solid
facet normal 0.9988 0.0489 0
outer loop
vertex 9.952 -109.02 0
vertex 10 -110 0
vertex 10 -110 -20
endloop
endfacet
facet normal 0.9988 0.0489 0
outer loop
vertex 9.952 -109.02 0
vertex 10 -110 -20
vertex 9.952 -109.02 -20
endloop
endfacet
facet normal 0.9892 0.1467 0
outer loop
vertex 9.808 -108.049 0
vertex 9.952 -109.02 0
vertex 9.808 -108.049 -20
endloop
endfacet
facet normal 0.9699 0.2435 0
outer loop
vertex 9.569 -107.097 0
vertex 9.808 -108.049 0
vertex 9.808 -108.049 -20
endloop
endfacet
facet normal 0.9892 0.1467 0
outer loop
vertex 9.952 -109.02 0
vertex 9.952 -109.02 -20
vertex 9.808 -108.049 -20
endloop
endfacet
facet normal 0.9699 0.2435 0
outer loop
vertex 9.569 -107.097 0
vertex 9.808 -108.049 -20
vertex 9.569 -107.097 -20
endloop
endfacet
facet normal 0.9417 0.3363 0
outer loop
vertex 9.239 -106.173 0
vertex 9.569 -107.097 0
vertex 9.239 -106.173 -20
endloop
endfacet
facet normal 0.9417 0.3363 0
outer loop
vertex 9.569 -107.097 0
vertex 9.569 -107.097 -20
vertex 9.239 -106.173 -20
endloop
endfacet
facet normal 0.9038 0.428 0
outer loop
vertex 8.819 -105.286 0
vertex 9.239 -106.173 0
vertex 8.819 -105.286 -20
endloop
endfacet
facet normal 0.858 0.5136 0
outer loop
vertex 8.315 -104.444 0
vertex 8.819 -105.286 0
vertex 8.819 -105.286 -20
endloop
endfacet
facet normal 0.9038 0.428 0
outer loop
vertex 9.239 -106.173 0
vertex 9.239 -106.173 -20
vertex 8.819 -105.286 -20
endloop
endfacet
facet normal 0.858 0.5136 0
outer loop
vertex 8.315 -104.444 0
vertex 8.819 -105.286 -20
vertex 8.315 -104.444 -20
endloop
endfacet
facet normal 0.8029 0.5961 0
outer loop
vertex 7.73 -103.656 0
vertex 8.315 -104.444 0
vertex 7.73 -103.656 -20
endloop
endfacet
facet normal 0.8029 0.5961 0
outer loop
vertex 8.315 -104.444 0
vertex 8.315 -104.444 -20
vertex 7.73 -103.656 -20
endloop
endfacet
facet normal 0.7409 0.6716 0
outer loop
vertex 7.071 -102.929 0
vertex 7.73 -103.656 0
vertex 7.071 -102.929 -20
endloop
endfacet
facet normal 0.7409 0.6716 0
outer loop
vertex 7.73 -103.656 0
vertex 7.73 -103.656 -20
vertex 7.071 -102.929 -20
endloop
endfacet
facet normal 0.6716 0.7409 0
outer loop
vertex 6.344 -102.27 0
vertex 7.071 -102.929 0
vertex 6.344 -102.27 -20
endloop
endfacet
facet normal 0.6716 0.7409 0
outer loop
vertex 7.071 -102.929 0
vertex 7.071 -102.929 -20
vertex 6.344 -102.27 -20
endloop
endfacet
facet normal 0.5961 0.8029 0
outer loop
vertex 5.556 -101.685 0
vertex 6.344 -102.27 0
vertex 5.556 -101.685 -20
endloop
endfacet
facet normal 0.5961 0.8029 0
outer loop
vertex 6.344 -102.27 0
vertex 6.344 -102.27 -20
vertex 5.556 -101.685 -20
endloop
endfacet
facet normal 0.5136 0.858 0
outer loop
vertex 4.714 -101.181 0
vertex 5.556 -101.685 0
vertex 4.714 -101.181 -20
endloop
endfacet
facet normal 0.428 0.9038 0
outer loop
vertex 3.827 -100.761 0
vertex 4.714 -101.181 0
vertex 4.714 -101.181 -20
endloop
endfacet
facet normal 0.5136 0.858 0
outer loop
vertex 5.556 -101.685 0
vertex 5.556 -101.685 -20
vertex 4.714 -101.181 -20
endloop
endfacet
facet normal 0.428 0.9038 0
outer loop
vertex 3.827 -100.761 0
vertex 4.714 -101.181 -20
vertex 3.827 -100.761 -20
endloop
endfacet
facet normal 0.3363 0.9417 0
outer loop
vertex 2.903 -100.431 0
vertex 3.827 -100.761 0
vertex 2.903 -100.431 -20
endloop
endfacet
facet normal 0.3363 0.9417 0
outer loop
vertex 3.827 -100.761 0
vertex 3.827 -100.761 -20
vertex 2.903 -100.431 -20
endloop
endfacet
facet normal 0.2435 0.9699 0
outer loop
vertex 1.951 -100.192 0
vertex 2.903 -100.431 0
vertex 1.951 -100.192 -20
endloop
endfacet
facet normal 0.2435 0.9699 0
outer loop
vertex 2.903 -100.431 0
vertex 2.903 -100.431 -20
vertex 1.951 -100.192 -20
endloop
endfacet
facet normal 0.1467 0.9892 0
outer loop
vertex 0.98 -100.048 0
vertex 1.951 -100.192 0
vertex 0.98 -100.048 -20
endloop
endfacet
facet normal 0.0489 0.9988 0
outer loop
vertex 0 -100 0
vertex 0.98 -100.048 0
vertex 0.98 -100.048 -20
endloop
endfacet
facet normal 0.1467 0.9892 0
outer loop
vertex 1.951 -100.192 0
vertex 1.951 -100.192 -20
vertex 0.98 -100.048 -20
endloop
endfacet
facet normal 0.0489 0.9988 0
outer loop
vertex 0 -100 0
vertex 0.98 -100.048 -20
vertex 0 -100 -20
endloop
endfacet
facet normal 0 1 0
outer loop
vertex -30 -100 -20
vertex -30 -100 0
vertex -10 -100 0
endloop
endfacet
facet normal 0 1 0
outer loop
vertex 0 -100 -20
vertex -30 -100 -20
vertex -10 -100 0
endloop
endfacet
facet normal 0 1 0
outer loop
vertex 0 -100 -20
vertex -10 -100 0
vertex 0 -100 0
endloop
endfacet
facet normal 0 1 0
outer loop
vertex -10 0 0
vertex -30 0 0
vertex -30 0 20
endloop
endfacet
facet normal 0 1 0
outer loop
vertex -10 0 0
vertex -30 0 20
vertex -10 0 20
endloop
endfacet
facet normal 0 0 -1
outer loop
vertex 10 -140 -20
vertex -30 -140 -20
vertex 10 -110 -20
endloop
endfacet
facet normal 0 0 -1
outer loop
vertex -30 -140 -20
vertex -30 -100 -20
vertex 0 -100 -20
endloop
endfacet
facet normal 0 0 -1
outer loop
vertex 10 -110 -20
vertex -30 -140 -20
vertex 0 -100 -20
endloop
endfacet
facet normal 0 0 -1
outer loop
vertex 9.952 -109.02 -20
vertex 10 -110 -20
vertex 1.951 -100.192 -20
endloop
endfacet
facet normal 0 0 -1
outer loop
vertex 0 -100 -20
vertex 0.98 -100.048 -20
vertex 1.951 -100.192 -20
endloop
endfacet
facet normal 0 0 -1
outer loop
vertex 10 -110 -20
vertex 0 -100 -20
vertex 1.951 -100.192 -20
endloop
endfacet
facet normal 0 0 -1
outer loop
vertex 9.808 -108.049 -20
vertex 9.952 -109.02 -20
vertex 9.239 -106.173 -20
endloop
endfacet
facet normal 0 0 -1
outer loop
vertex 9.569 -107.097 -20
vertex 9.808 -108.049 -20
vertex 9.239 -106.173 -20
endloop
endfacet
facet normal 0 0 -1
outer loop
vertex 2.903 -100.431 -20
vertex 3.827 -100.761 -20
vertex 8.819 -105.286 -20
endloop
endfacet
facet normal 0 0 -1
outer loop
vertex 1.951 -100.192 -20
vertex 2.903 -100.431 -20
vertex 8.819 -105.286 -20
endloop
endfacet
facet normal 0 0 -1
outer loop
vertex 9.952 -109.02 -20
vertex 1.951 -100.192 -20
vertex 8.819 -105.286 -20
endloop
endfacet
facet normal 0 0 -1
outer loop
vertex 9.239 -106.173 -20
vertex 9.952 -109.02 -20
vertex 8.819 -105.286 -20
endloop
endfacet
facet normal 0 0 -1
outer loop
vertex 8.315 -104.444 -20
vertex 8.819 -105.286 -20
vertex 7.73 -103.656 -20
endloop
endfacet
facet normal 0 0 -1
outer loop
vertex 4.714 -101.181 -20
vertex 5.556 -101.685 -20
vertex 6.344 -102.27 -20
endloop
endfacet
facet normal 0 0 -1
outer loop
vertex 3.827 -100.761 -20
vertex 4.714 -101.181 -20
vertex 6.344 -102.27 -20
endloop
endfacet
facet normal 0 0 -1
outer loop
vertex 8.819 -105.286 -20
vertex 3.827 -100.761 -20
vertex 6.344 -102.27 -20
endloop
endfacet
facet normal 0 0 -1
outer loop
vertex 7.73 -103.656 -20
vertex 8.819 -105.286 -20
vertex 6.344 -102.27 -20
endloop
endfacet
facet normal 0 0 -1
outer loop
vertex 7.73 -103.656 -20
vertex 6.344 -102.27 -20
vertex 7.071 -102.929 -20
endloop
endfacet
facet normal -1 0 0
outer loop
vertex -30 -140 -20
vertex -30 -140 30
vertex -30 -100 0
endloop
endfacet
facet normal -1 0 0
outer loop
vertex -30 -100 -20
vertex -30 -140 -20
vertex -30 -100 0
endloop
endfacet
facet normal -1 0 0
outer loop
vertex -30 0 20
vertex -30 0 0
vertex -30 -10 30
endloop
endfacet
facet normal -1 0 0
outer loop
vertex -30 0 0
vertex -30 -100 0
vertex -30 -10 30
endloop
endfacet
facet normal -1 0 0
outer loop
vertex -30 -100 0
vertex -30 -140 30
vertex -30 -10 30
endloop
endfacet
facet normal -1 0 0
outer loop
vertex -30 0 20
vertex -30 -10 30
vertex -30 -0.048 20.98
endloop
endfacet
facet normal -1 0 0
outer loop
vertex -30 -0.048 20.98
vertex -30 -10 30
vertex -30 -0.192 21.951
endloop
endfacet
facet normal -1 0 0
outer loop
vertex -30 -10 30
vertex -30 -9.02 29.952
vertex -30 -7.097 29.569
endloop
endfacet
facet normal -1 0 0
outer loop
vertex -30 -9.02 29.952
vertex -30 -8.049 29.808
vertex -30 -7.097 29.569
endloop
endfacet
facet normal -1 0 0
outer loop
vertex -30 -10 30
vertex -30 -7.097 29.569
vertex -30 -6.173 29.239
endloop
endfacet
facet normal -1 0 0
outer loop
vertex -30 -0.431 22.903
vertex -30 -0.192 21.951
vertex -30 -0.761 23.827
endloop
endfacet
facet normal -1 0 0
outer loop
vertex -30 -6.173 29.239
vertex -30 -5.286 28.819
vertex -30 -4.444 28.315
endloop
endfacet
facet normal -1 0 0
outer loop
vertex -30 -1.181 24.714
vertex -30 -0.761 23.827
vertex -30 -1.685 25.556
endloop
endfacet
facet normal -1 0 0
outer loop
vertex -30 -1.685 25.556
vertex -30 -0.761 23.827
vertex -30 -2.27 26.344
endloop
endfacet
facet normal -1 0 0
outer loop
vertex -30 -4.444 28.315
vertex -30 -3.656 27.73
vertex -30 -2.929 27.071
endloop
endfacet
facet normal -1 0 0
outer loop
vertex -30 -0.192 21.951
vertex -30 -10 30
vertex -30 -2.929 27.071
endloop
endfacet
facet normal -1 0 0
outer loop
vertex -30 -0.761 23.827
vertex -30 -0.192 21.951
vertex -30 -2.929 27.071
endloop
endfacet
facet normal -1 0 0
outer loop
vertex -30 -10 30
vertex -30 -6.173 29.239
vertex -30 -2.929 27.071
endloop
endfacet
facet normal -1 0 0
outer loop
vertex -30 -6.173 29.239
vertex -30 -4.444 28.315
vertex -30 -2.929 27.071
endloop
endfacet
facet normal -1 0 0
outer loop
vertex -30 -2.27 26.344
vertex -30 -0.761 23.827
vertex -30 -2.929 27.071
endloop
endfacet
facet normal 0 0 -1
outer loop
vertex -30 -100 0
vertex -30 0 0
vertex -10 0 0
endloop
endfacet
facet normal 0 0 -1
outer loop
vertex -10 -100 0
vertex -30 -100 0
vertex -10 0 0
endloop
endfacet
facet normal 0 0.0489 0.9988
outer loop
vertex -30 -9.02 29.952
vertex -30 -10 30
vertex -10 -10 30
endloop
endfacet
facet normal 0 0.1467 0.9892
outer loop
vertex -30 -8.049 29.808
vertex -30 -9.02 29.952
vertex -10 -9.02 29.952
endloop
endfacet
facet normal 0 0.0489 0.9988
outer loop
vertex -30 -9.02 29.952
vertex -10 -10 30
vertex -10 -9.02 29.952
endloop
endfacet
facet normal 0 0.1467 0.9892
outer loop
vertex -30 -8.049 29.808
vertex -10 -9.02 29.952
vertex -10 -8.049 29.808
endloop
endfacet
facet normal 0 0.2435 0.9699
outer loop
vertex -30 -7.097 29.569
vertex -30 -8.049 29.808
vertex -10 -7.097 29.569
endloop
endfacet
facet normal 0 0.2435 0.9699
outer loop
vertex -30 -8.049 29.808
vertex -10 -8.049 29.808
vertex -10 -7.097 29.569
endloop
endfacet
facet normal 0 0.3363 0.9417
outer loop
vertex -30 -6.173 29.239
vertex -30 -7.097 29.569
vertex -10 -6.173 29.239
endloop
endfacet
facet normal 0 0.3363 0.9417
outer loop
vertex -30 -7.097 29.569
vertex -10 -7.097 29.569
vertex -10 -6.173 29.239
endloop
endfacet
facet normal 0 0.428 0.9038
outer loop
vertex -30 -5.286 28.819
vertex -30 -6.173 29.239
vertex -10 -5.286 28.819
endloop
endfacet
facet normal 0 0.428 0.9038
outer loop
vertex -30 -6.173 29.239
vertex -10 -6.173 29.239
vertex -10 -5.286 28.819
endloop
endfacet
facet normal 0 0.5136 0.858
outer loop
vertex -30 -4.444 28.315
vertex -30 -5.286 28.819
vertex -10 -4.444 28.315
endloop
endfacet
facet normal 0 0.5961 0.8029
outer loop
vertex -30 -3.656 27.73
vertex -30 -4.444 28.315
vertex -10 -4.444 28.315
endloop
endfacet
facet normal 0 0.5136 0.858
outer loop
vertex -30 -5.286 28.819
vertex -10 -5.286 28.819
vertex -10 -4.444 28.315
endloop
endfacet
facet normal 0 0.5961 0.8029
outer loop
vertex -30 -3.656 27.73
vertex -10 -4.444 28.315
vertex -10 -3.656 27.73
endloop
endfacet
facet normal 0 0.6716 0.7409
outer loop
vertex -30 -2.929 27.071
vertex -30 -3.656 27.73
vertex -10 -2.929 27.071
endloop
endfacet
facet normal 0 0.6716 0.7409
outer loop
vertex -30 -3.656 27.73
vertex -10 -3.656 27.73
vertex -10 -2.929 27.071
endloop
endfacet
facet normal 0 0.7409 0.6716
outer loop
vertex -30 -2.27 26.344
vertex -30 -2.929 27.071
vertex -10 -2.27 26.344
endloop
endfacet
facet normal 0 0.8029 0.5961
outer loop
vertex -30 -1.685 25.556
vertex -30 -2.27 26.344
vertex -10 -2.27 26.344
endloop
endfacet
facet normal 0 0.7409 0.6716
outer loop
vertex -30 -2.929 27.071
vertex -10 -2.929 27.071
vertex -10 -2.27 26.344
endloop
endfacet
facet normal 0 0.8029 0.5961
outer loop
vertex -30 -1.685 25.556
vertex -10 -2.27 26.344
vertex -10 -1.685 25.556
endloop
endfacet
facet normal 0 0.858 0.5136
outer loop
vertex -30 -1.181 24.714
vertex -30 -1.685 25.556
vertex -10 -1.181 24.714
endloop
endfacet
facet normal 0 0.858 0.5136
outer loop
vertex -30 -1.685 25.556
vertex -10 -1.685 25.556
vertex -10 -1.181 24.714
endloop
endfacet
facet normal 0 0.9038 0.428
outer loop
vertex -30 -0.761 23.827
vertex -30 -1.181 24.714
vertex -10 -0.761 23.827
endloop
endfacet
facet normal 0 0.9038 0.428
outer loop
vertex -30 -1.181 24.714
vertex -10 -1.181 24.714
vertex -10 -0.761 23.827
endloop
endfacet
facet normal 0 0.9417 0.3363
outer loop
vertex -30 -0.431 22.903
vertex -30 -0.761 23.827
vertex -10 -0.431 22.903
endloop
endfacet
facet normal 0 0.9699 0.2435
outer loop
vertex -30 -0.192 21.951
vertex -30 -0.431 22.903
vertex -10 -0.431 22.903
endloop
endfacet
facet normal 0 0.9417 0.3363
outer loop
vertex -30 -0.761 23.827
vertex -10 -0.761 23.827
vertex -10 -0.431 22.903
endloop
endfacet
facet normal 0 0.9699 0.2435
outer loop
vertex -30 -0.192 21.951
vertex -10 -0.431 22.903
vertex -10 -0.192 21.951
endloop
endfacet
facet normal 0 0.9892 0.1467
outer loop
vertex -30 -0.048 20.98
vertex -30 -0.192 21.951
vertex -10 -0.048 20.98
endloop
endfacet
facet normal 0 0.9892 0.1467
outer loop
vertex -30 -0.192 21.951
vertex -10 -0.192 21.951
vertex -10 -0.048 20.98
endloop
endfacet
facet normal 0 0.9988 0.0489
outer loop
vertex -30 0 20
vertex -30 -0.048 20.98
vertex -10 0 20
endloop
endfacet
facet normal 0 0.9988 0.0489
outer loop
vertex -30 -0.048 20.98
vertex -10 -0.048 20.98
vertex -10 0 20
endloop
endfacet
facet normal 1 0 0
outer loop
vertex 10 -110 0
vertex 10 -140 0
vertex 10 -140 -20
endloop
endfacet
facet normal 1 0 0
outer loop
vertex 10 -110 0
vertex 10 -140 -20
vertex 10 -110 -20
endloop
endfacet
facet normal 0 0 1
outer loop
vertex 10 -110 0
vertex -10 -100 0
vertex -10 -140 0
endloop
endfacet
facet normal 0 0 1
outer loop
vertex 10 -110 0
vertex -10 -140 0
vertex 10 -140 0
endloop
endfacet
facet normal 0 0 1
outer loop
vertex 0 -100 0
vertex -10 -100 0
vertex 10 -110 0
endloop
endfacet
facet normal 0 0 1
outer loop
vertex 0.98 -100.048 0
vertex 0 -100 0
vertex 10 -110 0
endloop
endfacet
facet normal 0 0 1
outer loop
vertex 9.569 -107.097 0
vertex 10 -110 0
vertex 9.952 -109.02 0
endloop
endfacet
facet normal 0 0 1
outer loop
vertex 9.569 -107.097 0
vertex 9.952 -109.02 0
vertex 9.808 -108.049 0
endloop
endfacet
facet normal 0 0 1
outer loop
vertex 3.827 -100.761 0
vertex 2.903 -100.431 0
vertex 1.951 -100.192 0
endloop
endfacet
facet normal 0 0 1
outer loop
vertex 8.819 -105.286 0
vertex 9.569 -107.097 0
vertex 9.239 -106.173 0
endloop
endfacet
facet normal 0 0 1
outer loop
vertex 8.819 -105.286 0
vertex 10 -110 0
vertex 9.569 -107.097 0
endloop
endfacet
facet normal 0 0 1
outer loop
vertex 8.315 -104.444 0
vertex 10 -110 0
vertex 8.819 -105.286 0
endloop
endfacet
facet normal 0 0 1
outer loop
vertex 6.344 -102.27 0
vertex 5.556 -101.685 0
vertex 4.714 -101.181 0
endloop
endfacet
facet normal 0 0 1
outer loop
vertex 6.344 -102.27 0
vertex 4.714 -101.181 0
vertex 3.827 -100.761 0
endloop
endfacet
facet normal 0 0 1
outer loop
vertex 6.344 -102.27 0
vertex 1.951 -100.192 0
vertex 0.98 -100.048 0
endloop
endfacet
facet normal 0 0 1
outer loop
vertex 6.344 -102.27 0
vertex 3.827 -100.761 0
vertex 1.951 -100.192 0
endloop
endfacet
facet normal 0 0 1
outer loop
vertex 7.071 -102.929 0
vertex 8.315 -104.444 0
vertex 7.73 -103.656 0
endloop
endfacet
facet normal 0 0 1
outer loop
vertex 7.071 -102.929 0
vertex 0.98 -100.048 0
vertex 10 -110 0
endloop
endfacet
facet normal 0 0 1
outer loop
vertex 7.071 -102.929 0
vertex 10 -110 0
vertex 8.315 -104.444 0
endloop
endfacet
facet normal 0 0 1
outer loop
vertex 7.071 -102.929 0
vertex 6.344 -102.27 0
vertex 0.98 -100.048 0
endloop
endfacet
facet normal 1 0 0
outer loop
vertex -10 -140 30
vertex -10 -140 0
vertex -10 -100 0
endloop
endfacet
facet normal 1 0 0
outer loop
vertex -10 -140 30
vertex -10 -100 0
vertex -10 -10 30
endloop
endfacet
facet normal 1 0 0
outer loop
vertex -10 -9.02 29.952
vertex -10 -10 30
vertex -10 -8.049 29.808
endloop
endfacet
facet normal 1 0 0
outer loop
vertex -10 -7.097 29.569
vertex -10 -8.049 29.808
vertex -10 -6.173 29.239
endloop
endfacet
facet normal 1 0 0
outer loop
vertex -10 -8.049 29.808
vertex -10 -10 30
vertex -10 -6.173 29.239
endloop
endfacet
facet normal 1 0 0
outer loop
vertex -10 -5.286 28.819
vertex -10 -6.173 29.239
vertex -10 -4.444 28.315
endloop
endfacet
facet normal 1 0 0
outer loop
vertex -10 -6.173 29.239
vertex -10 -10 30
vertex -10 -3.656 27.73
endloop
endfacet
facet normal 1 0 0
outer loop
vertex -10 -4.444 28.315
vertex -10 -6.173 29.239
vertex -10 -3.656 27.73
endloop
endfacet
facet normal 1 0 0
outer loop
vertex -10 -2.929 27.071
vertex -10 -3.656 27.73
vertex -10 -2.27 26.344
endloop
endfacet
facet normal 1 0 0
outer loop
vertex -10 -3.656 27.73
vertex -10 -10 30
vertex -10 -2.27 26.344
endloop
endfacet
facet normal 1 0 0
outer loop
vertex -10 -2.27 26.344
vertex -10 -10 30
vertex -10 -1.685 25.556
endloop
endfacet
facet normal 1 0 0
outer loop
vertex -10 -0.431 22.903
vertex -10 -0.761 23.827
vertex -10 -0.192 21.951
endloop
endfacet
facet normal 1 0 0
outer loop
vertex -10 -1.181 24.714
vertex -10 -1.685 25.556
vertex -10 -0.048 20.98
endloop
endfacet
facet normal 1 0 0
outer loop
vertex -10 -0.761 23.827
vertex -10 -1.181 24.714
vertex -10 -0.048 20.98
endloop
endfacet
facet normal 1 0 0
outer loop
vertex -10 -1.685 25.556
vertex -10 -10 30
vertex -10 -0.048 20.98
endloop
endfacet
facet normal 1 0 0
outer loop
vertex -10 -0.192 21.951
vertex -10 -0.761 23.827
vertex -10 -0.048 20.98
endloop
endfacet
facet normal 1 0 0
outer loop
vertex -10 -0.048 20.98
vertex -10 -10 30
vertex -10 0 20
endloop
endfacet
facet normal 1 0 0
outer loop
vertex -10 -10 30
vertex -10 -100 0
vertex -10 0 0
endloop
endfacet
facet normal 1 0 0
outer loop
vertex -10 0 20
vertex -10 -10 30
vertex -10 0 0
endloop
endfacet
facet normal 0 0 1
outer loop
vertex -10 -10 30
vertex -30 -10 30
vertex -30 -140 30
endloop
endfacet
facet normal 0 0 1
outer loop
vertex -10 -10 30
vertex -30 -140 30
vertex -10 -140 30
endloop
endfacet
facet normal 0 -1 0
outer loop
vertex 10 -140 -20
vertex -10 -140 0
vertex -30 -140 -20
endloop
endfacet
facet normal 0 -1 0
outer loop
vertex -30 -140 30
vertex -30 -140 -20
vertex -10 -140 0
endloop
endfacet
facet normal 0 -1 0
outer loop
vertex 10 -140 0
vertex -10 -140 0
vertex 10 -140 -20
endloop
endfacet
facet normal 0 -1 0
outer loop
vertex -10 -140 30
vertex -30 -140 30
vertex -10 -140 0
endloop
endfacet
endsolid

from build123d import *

# Parameters (mm, degrees)
SKETCH1_W           = 20
SKETCH1_H           = 140
BOSS_EXTRUDE1_DEPTH = 30
SKETCH2_W           = 40
SKETCH2_H           = 40
BOSS_EXTRUDE2_DEPTH = 20
FILLET1_R           = 10


with BuildPart() as part:
    # Sketch1 → Boss-Extrude1 (new body)
    with BuildSketch(Plane.XY):
        with Locations((-20, -70)):
            Rectangle(SKETCH1_W, SKETCH1_H)
    extrude(amount=BOSS_EXTRUDE1_DEPTH)

    # Sketch2 → Boss-Extrude2 (add)
    with BuildSketch(Plane.XY):
        with Locations((-10, -120)):
            Rectangle(SKETCH2_W, SKETCH2_H)
    extrude(amount=-BOSS_EXTRUDE2_DEPTH)

    # Fillet1
    fillet1_edges = [part.edges().sort_by_distance(p)[0] for p in [
        (10, -100, -10),
        (-20, 0, 30),
    ]]
    fillet(fillet1_edges, radius=FILLET1_R)


solid = part.part
